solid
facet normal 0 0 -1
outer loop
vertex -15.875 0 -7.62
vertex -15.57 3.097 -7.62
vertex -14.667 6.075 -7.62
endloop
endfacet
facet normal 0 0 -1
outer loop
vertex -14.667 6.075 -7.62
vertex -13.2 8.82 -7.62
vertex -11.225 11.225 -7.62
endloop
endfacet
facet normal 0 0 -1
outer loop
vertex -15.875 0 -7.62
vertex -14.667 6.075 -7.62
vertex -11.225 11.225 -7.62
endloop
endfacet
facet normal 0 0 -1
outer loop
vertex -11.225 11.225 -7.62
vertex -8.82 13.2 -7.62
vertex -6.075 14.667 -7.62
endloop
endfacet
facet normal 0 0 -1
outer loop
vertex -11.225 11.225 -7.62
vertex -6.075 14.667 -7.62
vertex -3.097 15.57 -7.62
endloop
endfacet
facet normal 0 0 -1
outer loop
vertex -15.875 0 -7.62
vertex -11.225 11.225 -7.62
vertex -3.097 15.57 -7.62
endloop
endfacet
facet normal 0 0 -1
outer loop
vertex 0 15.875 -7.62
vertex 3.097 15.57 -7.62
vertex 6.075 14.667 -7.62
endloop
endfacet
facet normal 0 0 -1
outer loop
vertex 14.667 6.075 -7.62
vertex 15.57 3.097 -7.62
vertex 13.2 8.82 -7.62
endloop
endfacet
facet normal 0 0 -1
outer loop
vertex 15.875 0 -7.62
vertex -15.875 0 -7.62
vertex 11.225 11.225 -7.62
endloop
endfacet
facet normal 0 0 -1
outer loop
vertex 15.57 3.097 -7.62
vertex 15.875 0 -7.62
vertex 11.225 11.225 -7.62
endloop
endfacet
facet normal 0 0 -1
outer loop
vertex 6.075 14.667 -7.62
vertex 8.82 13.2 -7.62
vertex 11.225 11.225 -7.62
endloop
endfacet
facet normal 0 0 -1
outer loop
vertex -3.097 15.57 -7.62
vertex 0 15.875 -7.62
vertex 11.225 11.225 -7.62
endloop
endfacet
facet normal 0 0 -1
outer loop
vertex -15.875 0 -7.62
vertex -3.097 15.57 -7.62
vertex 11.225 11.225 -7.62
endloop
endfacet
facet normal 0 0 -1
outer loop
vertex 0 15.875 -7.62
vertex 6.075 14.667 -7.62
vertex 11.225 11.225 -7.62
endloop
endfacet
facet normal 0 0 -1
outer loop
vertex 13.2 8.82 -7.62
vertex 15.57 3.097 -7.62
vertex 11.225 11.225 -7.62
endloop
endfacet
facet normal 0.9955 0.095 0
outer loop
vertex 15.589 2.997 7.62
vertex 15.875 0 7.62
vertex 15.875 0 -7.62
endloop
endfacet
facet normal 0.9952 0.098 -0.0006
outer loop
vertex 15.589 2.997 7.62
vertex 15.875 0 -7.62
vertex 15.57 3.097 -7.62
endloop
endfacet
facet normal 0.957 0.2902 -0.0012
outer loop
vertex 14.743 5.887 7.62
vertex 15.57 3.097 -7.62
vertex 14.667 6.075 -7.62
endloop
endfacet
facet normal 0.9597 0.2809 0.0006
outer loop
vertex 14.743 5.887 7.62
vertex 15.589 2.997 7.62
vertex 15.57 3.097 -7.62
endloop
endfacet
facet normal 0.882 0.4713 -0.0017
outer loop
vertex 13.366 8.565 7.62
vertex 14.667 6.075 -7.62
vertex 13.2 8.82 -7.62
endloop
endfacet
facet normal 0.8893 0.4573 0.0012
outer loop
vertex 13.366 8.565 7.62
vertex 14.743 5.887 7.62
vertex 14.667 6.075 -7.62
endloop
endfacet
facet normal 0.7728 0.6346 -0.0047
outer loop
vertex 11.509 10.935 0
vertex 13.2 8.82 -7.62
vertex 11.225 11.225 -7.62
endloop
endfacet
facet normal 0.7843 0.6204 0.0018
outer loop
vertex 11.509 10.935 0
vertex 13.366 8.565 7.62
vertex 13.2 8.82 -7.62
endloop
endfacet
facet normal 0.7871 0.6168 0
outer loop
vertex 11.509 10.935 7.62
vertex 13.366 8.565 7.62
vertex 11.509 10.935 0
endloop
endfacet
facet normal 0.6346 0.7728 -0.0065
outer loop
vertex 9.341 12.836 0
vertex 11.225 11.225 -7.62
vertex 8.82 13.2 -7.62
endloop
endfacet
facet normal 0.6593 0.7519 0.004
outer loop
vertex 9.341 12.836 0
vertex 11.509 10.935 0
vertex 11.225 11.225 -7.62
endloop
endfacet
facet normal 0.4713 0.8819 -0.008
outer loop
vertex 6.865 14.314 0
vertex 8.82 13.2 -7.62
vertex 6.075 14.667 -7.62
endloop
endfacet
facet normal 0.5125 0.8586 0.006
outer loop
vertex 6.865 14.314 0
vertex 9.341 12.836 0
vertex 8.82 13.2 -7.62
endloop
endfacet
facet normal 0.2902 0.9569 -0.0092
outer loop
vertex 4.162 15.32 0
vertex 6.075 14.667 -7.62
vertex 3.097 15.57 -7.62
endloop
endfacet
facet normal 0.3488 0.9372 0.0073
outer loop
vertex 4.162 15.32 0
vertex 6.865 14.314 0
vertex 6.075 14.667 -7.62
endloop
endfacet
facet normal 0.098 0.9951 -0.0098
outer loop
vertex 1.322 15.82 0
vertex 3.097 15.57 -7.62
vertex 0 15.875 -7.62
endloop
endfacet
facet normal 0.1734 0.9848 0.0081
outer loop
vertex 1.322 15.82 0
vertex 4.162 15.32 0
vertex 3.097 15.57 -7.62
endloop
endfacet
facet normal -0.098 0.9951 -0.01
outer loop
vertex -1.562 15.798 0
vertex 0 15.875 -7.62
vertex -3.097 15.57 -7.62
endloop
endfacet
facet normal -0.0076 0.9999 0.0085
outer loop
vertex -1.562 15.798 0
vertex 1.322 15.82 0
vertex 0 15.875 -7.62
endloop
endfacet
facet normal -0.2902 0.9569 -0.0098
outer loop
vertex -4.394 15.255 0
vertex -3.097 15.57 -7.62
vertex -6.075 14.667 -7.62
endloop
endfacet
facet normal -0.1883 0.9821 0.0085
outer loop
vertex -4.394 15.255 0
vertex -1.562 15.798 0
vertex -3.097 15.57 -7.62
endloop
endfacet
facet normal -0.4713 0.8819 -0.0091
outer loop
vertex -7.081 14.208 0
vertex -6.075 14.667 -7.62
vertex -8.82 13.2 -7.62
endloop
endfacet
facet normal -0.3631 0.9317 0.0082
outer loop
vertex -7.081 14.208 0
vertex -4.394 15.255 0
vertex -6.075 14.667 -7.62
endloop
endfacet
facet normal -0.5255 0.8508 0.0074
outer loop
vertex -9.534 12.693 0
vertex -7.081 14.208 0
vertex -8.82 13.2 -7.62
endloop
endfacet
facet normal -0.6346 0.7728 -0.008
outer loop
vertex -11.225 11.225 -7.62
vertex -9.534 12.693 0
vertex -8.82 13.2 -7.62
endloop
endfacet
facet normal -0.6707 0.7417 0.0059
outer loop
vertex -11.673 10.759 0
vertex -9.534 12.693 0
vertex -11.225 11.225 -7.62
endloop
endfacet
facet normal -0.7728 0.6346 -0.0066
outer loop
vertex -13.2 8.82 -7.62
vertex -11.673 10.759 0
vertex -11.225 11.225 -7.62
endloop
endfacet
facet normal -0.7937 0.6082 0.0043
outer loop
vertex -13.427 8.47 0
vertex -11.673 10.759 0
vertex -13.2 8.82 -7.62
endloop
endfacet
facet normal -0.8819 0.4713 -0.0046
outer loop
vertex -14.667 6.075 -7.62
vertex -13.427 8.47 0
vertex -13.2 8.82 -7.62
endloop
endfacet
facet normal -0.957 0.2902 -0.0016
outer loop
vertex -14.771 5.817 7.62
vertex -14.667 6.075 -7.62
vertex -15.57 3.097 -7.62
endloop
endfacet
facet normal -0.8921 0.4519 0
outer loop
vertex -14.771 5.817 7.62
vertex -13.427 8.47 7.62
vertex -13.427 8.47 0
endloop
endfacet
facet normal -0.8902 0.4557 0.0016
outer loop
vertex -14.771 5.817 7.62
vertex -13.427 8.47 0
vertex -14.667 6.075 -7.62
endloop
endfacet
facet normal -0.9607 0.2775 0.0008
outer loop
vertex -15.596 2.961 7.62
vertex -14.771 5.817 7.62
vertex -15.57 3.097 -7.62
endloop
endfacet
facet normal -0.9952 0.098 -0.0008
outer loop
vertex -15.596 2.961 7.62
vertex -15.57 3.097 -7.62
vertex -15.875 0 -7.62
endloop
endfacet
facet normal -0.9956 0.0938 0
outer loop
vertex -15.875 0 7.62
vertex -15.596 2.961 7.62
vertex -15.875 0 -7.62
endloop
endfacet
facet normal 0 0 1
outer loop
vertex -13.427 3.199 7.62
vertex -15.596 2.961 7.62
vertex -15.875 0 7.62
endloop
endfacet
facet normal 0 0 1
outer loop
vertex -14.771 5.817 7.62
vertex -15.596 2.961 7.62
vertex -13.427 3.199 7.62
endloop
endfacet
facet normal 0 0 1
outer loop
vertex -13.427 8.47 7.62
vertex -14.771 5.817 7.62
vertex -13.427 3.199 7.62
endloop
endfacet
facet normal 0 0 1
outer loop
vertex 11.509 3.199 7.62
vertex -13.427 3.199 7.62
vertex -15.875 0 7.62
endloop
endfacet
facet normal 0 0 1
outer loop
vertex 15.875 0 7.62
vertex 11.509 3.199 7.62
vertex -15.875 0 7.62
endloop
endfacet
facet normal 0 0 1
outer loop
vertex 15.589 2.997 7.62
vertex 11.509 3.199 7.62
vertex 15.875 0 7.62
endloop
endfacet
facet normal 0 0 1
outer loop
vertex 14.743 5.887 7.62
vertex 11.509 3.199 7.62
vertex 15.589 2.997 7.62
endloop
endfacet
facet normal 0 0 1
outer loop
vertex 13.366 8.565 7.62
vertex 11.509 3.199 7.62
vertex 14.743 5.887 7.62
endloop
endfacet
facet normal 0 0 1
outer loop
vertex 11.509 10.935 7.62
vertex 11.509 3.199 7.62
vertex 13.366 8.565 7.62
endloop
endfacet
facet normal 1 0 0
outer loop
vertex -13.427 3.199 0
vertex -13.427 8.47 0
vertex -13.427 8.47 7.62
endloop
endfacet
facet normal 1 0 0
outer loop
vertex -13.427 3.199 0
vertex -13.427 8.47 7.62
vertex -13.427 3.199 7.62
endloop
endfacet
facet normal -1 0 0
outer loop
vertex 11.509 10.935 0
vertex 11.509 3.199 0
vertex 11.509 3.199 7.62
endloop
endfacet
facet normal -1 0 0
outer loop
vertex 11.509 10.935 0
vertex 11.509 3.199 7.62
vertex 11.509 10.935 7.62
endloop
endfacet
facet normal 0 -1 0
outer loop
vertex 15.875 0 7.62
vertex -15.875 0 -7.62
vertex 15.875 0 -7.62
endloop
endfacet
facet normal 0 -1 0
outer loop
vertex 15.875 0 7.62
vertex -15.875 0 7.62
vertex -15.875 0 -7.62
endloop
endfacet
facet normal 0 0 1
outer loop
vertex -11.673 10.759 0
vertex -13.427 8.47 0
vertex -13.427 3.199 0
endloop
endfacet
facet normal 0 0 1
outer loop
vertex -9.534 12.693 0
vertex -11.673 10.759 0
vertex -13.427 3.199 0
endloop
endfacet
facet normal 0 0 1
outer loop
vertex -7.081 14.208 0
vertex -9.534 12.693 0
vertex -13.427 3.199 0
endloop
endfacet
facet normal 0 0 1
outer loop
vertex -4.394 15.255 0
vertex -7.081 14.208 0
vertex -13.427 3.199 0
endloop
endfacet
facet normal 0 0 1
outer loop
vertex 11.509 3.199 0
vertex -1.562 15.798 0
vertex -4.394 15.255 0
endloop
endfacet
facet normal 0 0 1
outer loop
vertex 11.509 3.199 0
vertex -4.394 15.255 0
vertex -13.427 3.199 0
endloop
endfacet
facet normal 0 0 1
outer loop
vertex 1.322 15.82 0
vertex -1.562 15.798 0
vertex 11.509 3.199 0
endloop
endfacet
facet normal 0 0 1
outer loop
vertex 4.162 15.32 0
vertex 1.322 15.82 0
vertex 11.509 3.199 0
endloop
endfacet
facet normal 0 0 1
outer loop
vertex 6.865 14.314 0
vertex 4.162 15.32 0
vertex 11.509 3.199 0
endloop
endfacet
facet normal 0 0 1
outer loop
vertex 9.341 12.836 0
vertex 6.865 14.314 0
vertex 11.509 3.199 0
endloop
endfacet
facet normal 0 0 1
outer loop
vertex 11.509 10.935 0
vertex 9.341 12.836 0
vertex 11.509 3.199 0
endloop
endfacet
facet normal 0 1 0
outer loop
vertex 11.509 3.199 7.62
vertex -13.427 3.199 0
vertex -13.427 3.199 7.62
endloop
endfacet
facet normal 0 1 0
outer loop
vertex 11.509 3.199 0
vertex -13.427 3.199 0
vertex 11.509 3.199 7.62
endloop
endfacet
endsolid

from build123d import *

# Parameters (mm, degrees)
BOSS_EXTRUDE1_DEPTH = 7.62
CUT_EXTRUDE1_DEPTH  = 24.708556472


with BuildPart() as part:
    # Sketch1 → Boss-Extrude1 (new, symmetric)
    with BuildSketch(Plane.XY):
        with BuildLine():
            Line((-15.875, 0), (15.875, 0))
            ThreePointArc((15.875, 0), (0, 15.875), (-15.875, 0))
        make_face()
    extrude(amount=BOSS_EXTRUDE1_DEPTH, both=True)

    # Sketch2 → Cut-Extrude1 (cut, through all)
    with BuildSketch(Plane.XY):
        with BuildLine():
            Line((-13.426650235, 8.469987513), (-13.426650235, 3.198682523))
            Line((-13.426650235, 3.198682523), (11.508557344, 3.198682523))
            Line((11.508557344, 3.198682523), (11.508557344, 10.93474887))
            ThreePointArc((11.508557344, 10.93474887), (-1.56158004, 15.79800914), (-13.426650235, 8.469987513))
        make_face()
    extrude(amount=CUT_EXTRUDE1_DEPTH, mode=Mode.SUBTRACT)


solid = part.part
